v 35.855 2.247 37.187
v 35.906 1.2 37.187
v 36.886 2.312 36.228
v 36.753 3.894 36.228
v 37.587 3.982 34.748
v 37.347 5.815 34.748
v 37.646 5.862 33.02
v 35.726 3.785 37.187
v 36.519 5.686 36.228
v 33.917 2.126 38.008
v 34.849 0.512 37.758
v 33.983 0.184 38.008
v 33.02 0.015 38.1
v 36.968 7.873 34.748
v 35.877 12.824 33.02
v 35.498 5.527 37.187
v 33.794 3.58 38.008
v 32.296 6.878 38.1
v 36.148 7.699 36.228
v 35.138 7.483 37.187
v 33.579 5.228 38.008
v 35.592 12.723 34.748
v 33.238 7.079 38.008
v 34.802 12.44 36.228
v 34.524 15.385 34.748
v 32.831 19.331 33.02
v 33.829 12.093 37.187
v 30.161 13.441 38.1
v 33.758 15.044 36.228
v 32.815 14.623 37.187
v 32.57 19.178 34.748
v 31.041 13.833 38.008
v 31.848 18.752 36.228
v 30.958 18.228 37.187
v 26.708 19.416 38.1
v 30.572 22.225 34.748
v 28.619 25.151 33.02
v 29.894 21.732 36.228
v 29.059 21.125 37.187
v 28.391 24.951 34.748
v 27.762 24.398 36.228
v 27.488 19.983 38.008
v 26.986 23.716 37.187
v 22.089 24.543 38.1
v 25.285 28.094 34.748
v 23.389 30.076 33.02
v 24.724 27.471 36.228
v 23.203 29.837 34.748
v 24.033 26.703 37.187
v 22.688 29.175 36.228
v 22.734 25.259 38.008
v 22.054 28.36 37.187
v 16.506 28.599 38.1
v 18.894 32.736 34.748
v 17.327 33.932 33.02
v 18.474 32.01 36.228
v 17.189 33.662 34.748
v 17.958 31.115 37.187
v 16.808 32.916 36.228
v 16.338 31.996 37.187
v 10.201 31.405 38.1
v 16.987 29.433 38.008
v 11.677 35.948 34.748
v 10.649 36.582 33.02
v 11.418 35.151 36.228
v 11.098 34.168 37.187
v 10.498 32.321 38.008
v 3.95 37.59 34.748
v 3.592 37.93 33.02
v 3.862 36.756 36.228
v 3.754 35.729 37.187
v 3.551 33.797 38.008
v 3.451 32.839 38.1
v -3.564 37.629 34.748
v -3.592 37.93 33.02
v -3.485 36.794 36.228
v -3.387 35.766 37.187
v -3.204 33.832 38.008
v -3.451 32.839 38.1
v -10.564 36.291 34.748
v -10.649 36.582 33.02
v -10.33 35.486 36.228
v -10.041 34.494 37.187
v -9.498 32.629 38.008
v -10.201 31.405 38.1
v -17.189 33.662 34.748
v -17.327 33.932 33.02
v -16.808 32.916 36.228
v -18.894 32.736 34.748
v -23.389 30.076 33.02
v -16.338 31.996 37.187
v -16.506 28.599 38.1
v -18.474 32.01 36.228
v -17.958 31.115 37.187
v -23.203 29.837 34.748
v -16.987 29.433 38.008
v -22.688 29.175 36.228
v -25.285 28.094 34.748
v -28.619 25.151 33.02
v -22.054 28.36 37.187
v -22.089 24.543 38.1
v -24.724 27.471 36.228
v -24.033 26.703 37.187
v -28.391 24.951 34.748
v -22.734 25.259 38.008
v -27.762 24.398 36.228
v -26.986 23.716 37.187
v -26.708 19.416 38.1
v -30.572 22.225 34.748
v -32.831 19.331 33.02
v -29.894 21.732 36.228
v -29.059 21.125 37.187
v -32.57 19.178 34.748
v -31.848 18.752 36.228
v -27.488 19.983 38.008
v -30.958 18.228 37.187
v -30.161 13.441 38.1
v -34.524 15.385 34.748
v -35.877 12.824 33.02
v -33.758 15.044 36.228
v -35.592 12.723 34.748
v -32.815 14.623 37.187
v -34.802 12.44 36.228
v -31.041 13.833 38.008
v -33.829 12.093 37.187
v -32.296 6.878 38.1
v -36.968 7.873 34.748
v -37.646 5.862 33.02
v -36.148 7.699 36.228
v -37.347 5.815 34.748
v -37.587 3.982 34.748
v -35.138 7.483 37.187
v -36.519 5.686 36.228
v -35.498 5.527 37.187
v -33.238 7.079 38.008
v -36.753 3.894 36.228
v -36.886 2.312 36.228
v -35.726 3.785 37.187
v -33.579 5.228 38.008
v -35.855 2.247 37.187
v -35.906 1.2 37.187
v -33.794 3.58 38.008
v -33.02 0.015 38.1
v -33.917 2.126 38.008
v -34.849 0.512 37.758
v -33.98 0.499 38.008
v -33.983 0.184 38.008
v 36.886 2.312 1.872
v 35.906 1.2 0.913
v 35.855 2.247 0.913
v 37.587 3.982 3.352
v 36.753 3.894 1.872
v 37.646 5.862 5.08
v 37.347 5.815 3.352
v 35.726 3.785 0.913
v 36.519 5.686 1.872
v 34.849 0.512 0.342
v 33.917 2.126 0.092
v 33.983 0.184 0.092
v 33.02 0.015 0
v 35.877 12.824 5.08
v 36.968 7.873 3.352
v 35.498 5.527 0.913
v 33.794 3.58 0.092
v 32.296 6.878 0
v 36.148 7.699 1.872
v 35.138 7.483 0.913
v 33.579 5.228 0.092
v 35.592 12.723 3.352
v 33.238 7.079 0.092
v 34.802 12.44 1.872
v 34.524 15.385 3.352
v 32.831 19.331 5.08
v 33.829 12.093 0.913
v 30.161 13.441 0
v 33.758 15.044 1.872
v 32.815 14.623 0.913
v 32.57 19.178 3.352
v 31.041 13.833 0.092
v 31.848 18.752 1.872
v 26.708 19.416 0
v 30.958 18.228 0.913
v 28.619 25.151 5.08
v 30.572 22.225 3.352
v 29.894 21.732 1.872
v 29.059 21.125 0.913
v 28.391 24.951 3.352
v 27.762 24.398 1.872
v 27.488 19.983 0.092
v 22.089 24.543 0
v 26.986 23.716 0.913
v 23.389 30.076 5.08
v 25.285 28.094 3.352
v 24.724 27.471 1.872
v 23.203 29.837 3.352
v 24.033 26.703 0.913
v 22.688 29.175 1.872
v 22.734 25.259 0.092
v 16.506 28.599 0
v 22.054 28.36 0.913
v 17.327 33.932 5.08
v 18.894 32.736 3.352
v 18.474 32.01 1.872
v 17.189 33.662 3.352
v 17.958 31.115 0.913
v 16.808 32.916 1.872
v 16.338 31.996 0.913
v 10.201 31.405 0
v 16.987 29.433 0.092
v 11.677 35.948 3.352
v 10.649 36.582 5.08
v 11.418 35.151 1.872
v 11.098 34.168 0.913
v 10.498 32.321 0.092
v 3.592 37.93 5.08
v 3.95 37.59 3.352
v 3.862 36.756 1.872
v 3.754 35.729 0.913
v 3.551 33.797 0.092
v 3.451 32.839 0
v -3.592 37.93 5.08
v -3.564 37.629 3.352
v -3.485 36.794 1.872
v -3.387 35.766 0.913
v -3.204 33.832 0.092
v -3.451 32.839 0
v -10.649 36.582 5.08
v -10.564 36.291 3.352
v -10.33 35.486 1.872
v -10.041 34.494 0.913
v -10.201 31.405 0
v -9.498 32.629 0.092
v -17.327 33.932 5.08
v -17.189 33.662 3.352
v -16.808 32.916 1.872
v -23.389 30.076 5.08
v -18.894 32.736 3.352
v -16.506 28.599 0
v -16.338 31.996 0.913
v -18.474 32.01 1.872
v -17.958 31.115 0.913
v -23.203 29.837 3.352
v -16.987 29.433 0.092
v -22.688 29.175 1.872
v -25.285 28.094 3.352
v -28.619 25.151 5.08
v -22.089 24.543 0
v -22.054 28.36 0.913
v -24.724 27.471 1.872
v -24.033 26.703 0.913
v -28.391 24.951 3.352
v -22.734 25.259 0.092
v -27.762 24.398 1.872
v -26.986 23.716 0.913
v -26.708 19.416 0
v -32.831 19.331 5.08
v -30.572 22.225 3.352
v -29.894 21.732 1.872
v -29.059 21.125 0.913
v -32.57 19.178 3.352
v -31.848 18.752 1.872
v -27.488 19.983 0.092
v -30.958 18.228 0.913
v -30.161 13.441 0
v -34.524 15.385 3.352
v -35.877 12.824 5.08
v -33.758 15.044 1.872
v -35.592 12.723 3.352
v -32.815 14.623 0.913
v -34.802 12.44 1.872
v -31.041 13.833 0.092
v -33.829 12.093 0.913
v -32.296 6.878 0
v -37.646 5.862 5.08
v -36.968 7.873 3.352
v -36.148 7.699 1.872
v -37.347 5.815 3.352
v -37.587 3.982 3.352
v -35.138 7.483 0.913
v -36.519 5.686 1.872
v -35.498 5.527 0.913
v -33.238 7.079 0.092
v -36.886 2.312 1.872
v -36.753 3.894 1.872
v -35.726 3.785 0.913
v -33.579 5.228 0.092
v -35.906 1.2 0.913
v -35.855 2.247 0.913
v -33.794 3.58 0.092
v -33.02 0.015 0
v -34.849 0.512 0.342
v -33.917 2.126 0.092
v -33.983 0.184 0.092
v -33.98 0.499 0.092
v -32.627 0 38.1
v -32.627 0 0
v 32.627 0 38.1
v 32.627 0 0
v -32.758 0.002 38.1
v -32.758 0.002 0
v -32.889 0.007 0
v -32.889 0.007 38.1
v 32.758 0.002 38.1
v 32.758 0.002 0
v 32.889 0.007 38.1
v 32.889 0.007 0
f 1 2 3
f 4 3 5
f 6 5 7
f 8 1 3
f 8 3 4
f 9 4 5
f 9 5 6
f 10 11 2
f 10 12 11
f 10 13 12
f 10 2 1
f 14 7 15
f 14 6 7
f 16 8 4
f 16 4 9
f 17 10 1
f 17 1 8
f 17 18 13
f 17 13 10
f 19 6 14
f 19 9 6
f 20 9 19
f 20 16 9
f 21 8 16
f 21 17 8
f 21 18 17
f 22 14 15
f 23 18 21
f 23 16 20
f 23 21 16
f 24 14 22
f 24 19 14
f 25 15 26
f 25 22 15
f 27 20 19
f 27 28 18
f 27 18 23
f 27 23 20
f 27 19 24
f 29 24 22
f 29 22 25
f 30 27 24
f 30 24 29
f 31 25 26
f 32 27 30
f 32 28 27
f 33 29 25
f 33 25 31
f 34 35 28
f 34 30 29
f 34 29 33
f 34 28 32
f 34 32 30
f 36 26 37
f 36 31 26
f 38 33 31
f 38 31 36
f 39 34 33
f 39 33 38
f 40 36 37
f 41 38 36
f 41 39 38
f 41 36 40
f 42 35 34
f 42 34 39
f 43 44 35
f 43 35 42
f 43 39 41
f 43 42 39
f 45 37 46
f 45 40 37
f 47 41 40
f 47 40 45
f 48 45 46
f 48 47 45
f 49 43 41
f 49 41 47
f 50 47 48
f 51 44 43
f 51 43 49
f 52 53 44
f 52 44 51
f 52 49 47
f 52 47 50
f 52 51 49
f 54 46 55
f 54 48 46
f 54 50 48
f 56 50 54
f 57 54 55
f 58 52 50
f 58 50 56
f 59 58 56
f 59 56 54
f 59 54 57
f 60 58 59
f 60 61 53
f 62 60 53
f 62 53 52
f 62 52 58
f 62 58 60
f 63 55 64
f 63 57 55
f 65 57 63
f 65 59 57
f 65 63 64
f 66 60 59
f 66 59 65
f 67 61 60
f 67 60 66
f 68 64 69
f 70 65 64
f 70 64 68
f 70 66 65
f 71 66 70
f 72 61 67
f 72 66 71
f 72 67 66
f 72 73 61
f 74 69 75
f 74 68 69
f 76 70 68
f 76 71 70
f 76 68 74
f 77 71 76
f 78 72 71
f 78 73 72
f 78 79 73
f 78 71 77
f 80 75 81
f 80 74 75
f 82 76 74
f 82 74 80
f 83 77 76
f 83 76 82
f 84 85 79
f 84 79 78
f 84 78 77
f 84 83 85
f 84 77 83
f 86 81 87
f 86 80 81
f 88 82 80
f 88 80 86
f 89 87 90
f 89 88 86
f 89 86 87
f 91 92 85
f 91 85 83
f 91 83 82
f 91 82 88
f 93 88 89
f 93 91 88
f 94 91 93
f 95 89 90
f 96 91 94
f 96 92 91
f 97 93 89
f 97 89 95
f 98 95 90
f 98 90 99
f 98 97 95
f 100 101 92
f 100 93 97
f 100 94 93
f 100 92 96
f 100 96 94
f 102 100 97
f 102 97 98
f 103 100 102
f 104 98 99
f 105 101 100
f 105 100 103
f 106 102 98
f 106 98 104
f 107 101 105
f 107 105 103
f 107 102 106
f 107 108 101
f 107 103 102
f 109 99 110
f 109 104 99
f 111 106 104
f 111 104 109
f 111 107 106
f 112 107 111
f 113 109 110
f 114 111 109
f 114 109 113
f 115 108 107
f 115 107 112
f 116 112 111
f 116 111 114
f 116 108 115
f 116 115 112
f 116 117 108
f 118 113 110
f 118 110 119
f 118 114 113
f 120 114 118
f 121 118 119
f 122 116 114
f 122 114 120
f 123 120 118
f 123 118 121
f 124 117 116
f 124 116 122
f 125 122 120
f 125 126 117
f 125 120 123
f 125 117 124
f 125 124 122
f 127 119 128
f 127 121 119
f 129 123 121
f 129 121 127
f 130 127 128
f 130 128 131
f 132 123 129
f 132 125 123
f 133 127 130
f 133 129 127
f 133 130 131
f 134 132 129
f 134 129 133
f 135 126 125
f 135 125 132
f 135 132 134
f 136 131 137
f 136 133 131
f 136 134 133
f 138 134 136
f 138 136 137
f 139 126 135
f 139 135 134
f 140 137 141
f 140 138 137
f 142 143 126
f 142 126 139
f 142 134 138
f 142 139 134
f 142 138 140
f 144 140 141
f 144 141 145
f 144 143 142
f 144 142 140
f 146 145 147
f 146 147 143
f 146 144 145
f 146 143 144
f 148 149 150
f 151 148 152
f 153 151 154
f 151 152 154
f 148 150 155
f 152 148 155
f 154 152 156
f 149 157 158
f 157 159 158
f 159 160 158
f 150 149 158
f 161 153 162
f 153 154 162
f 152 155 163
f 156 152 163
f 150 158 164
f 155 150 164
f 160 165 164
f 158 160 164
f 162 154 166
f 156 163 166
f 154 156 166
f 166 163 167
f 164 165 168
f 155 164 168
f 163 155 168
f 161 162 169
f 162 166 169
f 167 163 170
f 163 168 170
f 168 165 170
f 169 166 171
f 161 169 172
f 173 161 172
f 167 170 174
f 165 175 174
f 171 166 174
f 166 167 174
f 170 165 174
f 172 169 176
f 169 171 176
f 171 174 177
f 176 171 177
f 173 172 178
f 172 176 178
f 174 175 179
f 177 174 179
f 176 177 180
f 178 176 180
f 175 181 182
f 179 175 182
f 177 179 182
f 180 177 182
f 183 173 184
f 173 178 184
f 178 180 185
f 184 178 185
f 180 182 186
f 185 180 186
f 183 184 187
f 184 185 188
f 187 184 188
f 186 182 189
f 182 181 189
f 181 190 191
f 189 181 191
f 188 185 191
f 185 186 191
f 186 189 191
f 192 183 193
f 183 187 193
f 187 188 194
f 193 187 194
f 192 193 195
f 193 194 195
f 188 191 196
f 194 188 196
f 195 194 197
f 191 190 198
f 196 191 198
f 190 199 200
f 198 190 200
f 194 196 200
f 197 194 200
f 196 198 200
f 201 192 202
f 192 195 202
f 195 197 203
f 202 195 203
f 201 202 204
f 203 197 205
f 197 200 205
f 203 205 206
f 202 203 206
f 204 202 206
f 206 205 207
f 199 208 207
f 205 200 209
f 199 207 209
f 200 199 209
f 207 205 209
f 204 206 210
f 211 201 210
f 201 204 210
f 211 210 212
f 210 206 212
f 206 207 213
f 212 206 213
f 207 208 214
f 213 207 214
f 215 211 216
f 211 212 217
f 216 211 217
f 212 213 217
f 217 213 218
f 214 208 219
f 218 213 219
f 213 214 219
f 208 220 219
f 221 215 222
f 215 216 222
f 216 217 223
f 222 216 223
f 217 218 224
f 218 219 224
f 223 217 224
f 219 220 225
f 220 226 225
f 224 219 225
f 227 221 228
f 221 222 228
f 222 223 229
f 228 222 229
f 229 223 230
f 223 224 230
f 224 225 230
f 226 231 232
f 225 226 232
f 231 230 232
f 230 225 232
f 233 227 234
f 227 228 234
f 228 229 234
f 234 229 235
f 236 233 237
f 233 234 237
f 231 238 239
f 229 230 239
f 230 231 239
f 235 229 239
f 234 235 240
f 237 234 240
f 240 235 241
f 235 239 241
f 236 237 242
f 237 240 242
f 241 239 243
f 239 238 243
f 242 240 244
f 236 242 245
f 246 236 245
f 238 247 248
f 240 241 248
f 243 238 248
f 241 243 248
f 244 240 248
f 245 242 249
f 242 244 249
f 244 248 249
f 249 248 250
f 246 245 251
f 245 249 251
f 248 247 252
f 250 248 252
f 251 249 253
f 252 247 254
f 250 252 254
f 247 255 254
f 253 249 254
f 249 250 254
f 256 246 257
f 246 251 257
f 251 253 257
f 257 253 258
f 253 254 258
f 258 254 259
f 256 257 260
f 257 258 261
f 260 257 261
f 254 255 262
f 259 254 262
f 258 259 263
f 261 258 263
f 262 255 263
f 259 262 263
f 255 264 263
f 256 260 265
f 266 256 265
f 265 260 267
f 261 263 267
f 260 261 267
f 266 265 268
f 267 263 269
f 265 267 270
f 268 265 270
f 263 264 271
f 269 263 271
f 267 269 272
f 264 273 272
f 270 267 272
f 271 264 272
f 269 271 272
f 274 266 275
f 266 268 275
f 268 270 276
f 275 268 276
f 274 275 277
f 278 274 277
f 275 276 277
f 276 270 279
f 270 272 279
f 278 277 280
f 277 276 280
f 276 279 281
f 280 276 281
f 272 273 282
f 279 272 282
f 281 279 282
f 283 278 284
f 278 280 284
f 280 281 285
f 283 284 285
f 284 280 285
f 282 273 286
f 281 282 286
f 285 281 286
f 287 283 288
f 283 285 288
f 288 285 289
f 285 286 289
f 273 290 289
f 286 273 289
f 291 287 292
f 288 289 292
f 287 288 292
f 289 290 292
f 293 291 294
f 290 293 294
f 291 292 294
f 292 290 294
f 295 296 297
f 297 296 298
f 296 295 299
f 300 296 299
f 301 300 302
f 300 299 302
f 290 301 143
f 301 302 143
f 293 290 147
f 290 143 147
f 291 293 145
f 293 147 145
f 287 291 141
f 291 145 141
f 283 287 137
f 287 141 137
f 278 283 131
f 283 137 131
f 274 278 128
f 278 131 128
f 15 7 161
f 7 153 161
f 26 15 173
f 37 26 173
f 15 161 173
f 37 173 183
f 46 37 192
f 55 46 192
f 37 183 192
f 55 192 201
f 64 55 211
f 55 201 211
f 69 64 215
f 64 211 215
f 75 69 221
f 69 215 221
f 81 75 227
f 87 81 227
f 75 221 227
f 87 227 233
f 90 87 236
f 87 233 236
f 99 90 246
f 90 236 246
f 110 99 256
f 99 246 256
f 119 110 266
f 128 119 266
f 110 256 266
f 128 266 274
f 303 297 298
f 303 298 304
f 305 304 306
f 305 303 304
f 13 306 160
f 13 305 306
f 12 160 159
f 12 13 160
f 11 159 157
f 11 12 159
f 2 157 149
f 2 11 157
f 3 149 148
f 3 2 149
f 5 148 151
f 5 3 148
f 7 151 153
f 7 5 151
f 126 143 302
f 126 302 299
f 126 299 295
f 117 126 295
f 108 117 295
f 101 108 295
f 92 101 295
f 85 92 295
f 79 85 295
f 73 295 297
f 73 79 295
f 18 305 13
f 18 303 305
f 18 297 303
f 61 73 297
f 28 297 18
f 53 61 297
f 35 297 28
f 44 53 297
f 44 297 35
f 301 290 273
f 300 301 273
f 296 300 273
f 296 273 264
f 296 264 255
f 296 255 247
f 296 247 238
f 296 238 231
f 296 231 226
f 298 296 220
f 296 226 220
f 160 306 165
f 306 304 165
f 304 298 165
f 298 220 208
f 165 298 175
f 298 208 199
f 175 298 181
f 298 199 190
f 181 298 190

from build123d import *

# Parameters (mm, degrees)
F1_DEPTH = 38.1
F2_R     = 5.08


with BuildPart() as f1:
    # F0 (on Top) → F1 (new body)
    with BuildSketch(Plane.XY):
        with BuildLine():
            Line((-38.1, 0), (38.1, 0))
            ThreePointArc((38.1, 0), (0, 38.1), (-38.1, 0))
        make_face()
    extrude(amount=F1_DEPTH)

    # F2
    f2_edges = [f1.edges().sort_by_distance(p)[0] for p in [
        (0, 38.1, 38.1),
        (38.1, 0, 19.05),
        (-38.1, 0, 19.05),
        (0, 38.1, 0),
    ]]
    fillet(f2_edges, radius=F2_R)


solid = f1.part
